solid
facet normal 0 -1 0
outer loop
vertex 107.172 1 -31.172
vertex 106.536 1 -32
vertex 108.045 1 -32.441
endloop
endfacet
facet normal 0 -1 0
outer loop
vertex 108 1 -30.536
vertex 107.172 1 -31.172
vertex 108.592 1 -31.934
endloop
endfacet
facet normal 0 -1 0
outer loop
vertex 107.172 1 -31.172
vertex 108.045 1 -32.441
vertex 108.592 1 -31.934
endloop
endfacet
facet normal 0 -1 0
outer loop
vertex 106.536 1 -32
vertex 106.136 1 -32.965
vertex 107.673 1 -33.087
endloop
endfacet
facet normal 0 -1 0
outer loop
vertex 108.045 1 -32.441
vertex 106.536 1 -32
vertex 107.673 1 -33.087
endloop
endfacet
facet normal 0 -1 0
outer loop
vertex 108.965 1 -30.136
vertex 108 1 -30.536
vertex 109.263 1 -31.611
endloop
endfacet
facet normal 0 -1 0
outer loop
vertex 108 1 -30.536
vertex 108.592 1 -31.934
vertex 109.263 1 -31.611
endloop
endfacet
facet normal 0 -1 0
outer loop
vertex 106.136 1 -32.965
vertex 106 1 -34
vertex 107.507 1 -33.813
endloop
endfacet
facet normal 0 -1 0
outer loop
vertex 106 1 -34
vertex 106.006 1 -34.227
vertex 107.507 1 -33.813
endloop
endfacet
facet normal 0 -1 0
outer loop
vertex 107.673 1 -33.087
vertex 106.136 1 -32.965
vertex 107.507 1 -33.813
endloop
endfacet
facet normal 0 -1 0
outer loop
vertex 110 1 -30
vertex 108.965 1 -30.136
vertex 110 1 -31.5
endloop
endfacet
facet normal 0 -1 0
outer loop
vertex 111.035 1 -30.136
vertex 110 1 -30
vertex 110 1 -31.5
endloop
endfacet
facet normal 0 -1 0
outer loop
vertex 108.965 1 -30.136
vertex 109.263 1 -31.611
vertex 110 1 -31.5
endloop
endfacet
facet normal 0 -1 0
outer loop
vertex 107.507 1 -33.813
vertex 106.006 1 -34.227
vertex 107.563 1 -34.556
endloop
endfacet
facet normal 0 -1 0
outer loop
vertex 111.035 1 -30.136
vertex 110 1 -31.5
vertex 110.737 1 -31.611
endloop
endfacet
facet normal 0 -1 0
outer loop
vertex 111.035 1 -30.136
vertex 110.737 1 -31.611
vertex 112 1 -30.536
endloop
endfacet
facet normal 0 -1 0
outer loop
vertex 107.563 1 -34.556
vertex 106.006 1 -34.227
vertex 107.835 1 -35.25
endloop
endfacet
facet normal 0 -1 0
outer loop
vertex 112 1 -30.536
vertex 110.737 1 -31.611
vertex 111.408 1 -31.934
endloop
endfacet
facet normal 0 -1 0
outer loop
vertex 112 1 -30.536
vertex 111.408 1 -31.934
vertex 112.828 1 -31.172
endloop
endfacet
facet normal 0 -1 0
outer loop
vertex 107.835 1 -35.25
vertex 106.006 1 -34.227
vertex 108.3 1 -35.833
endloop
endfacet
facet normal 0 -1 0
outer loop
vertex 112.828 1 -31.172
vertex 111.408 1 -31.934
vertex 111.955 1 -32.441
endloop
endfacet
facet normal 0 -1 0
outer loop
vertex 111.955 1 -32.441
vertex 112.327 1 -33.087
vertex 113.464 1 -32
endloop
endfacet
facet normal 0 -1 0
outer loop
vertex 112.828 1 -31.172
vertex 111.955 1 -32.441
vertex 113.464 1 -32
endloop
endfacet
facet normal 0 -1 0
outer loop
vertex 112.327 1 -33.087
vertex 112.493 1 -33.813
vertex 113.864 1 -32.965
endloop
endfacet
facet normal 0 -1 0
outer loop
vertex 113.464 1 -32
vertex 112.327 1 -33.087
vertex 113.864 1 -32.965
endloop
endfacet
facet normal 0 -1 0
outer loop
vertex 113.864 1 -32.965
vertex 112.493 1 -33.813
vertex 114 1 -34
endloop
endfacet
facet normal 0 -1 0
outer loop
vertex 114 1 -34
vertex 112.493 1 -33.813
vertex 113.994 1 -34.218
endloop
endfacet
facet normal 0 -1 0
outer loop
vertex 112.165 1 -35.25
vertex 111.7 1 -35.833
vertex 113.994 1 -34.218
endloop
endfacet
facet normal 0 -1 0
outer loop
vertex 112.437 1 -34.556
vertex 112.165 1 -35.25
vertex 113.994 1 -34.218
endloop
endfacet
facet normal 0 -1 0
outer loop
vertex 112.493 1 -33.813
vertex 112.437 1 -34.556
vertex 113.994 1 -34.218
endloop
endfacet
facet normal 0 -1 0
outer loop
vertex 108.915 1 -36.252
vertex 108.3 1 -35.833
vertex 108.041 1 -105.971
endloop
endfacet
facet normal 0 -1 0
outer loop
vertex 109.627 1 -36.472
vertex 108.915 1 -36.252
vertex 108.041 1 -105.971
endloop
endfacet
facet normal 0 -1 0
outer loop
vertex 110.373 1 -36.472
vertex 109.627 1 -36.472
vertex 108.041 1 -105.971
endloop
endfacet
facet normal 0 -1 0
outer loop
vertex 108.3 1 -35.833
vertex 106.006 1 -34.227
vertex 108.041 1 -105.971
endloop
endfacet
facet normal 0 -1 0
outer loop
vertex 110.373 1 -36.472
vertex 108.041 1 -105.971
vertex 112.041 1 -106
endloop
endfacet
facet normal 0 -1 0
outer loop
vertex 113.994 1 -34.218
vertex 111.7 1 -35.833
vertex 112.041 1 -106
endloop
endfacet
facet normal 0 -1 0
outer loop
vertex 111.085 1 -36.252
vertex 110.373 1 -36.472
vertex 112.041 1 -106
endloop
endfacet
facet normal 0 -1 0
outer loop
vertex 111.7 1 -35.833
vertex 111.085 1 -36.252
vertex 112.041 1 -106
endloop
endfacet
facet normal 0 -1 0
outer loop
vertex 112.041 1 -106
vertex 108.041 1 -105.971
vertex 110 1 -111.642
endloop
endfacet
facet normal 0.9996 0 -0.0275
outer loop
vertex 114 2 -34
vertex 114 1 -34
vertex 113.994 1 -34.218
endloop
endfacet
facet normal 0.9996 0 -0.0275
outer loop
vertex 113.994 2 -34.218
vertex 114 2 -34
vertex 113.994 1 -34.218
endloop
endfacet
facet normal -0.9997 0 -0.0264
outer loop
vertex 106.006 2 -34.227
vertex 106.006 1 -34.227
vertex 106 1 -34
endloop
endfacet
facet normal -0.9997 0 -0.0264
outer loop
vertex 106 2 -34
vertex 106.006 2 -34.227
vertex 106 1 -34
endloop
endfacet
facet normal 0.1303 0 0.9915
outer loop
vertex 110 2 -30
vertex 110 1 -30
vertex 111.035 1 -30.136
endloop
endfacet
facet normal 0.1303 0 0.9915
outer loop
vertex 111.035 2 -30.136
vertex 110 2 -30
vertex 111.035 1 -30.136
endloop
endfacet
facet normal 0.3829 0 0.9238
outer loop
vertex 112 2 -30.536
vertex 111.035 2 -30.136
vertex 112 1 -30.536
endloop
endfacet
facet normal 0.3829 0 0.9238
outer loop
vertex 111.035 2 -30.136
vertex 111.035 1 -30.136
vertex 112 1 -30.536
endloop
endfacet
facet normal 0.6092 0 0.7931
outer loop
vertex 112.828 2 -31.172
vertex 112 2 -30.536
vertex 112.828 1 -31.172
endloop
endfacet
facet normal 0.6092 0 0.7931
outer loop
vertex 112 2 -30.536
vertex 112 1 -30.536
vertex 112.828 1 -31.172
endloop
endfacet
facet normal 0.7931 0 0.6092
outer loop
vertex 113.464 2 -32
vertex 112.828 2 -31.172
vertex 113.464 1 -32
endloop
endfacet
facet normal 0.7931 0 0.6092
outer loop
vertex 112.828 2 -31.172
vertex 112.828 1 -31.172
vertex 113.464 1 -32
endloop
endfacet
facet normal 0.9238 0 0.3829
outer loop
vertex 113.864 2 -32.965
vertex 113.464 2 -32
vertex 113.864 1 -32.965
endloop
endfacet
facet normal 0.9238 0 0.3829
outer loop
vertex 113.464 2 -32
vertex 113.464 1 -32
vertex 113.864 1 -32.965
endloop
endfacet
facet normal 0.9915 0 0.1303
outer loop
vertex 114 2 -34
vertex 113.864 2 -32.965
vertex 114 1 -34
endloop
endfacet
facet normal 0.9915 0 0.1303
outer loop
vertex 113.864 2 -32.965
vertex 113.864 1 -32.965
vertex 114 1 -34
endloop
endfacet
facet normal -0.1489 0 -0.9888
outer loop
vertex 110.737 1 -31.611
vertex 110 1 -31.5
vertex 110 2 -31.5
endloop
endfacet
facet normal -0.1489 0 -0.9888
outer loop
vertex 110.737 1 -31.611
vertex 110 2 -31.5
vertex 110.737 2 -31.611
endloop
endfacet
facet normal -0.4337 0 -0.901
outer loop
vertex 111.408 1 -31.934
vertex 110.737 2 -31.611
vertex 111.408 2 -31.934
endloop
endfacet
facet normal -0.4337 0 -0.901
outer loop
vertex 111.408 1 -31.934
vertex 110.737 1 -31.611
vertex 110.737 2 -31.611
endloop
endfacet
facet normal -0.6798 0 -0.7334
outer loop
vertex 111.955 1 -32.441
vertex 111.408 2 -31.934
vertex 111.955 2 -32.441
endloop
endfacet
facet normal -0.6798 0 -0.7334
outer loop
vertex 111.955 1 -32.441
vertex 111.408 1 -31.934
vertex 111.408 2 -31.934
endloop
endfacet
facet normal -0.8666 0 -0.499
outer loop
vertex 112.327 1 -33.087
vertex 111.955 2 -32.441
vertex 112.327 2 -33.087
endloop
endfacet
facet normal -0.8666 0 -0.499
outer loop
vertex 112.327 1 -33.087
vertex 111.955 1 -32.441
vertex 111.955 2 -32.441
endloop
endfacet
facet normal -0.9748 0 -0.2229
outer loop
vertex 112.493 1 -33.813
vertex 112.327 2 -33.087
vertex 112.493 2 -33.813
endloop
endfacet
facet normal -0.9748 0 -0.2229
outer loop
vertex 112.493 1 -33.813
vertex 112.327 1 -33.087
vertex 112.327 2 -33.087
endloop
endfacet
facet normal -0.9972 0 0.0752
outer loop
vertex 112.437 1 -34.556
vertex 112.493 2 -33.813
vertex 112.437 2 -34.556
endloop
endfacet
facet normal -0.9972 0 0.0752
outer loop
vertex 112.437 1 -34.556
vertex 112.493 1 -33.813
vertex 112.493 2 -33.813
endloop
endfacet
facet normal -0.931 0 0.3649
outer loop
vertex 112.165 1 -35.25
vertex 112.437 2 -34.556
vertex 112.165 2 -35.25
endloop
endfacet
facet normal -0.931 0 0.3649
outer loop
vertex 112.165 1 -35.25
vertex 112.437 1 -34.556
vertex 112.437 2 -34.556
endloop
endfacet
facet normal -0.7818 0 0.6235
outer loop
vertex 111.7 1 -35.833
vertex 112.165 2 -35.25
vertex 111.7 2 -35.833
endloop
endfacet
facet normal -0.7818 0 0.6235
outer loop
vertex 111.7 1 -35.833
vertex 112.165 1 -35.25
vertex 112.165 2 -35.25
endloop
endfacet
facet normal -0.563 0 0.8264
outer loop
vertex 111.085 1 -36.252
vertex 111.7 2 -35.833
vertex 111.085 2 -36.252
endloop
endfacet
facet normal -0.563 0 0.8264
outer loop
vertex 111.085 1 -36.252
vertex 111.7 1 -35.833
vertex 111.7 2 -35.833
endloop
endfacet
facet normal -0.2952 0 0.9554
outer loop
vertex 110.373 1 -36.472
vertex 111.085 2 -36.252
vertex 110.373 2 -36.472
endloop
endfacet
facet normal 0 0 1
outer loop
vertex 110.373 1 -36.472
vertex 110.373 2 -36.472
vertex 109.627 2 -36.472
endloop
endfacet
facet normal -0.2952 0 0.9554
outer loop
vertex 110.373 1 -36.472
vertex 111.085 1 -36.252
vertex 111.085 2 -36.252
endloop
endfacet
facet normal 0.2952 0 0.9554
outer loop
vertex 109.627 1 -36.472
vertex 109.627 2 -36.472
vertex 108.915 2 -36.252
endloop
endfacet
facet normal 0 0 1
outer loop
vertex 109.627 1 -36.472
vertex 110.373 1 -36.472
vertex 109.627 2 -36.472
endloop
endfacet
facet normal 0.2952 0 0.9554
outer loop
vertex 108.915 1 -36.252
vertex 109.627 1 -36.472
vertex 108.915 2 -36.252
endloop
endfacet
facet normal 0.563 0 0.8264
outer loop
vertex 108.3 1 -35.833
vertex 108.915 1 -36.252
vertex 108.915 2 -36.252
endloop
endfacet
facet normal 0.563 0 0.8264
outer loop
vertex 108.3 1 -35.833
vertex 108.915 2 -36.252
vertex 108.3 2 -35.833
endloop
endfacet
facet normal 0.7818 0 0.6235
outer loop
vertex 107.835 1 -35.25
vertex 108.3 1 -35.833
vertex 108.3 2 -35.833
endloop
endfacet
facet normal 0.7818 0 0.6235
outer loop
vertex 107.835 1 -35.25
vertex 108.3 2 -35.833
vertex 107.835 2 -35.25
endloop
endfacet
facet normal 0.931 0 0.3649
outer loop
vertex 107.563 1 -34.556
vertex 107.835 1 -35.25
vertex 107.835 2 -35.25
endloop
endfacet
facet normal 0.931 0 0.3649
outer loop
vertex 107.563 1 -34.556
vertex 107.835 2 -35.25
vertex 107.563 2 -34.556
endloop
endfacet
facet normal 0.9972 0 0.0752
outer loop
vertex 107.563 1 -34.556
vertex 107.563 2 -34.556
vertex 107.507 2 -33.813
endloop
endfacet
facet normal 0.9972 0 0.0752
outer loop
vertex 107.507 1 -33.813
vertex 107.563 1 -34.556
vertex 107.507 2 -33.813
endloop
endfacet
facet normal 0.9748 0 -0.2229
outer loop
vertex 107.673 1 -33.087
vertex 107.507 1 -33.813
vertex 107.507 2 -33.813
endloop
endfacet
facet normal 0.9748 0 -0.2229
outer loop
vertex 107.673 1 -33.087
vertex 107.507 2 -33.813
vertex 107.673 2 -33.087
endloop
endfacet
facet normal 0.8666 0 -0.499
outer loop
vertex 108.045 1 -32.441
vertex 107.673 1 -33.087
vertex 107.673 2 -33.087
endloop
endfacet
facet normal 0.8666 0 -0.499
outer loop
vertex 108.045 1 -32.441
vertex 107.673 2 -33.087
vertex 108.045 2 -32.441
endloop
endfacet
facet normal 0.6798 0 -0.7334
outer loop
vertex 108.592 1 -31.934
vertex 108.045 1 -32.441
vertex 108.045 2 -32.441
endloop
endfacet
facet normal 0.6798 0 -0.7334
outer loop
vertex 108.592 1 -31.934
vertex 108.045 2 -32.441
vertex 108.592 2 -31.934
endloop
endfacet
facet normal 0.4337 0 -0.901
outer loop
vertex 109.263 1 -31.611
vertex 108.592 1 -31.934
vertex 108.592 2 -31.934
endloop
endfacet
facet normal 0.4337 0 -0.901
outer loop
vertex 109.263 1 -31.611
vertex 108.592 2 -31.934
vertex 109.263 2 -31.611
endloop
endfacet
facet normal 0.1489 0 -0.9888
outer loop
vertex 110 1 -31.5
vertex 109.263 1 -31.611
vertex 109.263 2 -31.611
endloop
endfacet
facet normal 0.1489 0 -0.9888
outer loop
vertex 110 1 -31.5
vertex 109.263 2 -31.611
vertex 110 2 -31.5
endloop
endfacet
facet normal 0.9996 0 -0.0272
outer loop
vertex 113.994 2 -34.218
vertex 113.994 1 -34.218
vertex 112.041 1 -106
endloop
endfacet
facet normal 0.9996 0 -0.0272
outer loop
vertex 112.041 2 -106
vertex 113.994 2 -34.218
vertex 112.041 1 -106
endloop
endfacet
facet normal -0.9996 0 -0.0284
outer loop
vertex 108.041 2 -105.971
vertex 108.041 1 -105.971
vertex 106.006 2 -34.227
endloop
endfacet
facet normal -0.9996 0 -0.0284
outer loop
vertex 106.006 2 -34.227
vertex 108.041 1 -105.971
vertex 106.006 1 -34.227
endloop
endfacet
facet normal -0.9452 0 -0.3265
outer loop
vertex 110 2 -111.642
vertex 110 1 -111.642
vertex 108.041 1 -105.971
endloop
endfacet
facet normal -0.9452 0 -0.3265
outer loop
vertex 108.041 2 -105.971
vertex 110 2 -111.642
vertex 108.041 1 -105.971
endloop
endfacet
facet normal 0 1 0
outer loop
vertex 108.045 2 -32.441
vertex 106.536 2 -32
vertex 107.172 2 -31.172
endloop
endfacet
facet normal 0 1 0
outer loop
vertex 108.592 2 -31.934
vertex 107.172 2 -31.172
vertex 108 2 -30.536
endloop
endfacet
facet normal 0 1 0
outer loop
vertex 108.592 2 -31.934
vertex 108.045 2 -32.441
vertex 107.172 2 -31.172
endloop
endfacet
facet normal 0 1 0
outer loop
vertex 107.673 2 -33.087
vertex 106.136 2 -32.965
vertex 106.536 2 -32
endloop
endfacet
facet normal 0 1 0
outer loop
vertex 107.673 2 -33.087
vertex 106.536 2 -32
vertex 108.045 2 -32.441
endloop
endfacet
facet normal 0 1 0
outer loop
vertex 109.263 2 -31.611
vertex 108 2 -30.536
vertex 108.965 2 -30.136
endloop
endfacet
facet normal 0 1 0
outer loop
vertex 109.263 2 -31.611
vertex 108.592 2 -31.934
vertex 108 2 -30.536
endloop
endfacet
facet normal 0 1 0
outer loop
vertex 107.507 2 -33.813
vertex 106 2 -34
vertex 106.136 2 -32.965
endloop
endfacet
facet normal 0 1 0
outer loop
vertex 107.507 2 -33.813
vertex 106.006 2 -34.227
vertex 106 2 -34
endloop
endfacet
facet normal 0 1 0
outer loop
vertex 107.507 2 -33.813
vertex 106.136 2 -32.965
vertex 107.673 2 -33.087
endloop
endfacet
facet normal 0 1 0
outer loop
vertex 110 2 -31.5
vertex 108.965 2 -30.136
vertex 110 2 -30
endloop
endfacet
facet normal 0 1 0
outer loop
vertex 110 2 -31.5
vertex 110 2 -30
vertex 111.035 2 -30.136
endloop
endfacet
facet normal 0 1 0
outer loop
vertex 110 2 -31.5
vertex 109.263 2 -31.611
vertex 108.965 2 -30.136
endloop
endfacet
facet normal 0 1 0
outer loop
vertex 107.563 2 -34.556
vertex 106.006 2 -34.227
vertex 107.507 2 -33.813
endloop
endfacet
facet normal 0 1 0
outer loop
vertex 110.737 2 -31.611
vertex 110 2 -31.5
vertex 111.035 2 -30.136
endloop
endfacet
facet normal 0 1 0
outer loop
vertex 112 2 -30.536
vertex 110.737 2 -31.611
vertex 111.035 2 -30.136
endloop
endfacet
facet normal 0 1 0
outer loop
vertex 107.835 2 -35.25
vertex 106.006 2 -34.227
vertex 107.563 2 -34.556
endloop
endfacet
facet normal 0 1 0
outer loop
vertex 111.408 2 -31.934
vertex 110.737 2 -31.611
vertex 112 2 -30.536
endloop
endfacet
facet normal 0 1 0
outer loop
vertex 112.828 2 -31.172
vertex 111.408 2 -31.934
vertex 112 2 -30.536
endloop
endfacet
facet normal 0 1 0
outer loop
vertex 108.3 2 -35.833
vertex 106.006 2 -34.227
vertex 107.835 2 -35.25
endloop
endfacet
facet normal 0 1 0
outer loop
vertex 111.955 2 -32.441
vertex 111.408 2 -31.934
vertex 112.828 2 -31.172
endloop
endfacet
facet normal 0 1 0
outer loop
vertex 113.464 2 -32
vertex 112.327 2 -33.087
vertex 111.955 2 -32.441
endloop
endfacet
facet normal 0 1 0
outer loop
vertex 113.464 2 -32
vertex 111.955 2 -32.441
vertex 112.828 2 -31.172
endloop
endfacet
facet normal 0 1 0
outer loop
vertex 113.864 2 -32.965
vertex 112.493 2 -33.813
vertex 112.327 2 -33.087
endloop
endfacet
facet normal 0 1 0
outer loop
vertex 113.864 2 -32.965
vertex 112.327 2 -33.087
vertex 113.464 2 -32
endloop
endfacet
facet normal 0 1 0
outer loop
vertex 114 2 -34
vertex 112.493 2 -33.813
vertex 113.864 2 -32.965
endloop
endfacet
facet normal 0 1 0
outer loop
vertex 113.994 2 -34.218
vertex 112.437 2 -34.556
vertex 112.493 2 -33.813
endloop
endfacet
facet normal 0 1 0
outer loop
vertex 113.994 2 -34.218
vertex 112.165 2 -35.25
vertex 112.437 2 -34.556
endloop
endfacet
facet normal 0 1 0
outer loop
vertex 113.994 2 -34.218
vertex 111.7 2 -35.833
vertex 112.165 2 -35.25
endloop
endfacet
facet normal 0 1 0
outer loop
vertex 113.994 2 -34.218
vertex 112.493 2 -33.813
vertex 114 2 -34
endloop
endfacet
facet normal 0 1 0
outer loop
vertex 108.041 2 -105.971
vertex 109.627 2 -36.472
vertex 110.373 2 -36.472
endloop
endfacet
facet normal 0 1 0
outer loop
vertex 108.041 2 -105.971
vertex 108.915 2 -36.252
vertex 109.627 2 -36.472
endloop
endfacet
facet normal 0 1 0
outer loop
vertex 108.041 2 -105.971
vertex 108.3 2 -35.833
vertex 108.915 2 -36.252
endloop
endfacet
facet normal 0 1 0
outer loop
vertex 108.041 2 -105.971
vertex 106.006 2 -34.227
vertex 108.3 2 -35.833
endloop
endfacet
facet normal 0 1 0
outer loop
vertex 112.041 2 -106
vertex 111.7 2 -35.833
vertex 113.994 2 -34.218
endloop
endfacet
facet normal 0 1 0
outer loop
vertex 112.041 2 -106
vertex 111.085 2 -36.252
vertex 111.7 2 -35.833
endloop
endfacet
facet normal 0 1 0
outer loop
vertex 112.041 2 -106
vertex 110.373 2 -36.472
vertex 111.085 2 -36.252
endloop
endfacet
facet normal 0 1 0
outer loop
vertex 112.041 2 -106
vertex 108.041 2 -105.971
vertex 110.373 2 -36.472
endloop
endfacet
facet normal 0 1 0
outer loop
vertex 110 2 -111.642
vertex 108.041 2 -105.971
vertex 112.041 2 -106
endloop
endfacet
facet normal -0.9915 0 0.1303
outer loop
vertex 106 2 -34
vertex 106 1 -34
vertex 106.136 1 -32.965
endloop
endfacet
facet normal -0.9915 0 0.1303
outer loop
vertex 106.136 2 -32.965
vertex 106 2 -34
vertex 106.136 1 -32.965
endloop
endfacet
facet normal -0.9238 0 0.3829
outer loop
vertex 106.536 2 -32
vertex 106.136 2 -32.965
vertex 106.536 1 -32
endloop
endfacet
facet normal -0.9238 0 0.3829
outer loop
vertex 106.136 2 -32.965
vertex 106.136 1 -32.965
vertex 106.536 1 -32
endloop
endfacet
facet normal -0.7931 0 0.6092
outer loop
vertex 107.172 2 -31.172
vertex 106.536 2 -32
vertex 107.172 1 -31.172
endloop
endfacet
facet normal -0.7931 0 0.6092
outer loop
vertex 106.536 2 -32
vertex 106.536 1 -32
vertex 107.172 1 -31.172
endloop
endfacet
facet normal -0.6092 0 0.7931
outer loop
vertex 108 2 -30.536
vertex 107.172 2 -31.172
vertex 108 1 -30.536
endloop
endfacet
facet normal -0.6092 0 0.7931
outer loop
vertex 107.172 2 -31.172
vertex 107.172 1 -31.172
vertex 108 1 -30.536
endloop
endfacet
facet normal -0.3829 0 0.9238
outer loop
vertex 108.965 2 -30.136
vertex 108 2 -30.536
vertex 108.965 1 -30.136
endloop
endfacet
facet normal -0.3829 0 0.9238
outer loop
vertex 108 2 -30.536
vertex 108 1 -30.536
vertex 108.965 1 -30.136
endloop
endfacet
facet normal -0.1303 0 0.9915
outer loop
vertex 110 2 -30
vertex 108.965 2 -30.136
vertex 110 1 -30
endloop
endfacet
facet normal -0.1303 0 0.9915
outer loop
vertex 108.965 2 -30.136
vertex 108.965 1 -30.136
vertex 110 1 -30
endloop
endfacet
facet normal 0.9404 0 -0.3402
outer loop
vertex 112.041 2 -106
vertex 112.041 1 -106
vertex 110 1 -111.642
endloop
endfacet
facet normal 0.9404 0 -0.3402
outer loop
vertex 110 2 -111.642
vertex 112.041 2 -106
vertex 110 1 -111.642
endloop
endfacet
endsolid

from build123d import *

# Parameters (mm, degrees)
SKICA1_R                 = 2
P_IDAT_VYSUNUT_M3_DEPTH  = 2
ODEBRAT_START            = -18
SKICA5_R                 = 2.5
SKICA5_R_2               = 2
ODEBRAT_VYSUNUT_M1_DEPTH = 18
SKICA1_6_R               = 2
ODEBRAT_VYSUNUT_M3_DEPTH = 1


with BuildPart() as part:
    # Skica1 → Přidat vysunutím3 (new body)
    with BuildSketch(Plane(origin=(0, 0, 0), x_dir=(1, 0, 0), z_dir=(0, 1, 0))):
        with BuildLine():
            ThreePointArc((106, 34), (110, 30), (114, 34))
            Line((114, 34), (112.040914438, 106))
            Line((112.040914438, 106), (110, 111.642221926))
            Line((110, 111.642221926), (108.040914438, 105.971068272))
            Line((108.040914438, 105.971068272), (106, 34))
        make_face()
        with Locations((110, 34)):
            Circle(SKICA1_R, mode=Mode.SUBTRACT)
    extrude(amount=P_IDAT_VYSUNUT_M3_DEPTH)

    # Skica5 → Odebrat vysunutím1 (cut)
    with BuildSketch(Plane(origin=(0, 2, 0), x_dir=(1, 0, 0), z_dir=(0, 1, 0)).offset(ODEBRAT_START)):
        with Locations((110, 34)):
            Circle(SKICA5_R)
        with Locations((110, 34)):
            Circle(SKICA5_R_2, mode=Mode.SUBTRACT)
    extrude(amount=ODEBRAT_VYSUNUT_M1_DEPTH, mode=Mode.SUBTRACT)

    # Skica1<6> → Odebrat vysunutím3 (cut)
    with BuildSketch(Plane(origin=(0, 0, 0), x_dir=(1, 0, 0), z_dir=(0, 1, 0))):
        with BuildLine():
            ThreePointArc((106, 34), (110, 30), (114, 34))
            Line((114, 34), (112.040914438, 106))
            Line((112.040914438, 106), (110, 111.642221926))
            Line((110, 111.642221926), (108.040914438, 105.971068272))
            Line((108.040914438, 105.971068272), (106, 34))
        make_face()
        with Locations((110, 34)):
            Circle(SKICA1_6_R, mode=Mode.SUBTRACT)
    extrude(amount=ODEBRAT_VYSUNUT_M3_DEPTH, mode=Mode.SUBTRACT)


solid = part.part
